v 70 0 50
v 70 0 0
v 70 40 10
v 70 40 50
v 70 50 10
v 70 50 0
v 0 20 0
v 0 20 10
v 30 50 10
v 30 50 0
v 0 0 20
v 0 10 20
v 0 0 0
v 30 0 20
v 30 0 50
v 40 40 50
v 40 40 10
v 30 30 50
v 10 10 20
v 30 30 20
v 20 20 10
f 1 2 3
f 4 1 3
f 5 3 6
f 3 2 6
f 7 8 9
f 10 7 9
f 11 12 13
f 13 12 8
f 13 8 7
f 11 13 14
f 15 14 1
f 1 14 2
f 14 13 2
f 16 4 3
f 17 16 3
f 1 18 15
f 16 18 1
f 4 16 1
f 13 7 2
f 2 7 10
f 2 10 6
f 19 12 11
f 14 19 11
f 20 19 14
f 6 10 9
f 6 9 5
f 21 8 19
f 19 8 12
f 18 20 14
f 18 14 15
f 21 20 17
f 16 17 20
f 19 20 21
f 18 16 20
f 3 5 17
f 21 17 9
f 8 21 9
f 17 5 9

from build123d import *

# Parameters (mm, degrees)
SKETCH1_W           = 70
SKETCH1_H           = 50
BOSS_EXTRUDE1_DEPTH = 50
CUT_EXTRUDE1_DEPTH  = 50
SKETCH3_W           = 40
SKETCH3_H           = 10
CUT_EXTRUDE2_DEPTH  = 50
CUT_EXTRUDE3_DEPTH  = 20
CUT_EXTRUDE4_DEPTH  = 10
CUT_EXTRUDE6_DEPTH  = 30
CUT_EXTRUDE7_DEPTH  = 30
CUT_EXTRUDE9_DEPTH  = 10
BOSS_EXTRUDE2_DEPTH = 43
CUT_EXTRUDE10_DEPTH = 10


with BuildPart() as part:
    # Sketch1 → Boss-Extrude1 (new body)
    with BuildSketch(Plane.XY):
        with Locations((35, 25)):
            Rectangle(SKETCH1_W, SKETCH1_H)
    extrude(amount=BOSS_EXTRUDE1_DEPTH)

    # Sketch2 → Cut-Extrude1 (cut)
    with BuildSketch(Plane.XY.offset(50)):
        Polygon((0, 20), (30, 50), (0, 50), align=None)
    extrude(amount=-CUT_EXTRUDE1_DEPTH, mode=Mode.SUBTRACT)

    # Sketch3 → Cut-Extrude2 (cut)
    with BuildSketch(Plane(origin=(70, 0, 0), x_dir=(0, 0, -1), z_dir=(1, 0, 0))):
        with Locations((-30, 45)):
            Rectangle(SKETCH3_W, SKETCH3_H)
    extrude(amount=-CUT_EXTRUDE2_DEPTH, mode=Mode.SUBTRACT)

    # Sketch4 → Cut-Extrude3 (cut)
    with BuildSketch(Plane.XY.offset(50)):
        Polygon((30, 30), (40, 40), (20, 40), (0, 20), (0, 0), (30, 0), align=None)
    extrude(amount=-CUT_EXTRUDE3_DEPTH, mode=Mode.SUBTRACT)

    # Sketch5 → Cut-Extrude4 (cut)
    with BuildSketch(Plane.XY.offset(30)):
        Polygon((0, 10), (10, 10), (40, 40), (20, 40), (0, 20), align=None)
    extrude(amount=-CUT_EXTRUDE4_DEPTH, mode=Mode.SUBTRACT)

    # Sketch6 → Cut-Extrude6 (cut)
    with BuildSketch(Plane.ZY):
        Polygon((30, 10), (20, 0), (30, 0), align=None)
    extrude(amount=-CUT_EXTRUDE6_DEPTH, mode=Mode.SUBTRACT)

    # Sketch7 → Cut-Extrude7 (cut)
    with BuildSketch(Plane.ZY):
        Polygon((30, 10), (20, 10), (20, 0), align=None)
    extrude(amount=-CUT_EXTRUDE7_DEPTH, mode=Mode.SUBTRACT)

    # Sketch9 → Cut-Extrude9 (cut)
    with BuildSketch(Plane.XY.offset(20)):
        Polygon((20, 40), (40, 40), (10, 10), (0, 10), (0, 20), align=None)
    extrude(amount=-CUT_EXTRUDE9_DEPTH, mode=Mode.SUBTRACT)

    # Sketch10 → Boss-Extrude2 (add)
    with BuildSketch(Plane.ZY):
        Polygon((10, 20), (20, 10), (10, 10), align=None)
    extrude(amount=-BOSS_EXTRUDE2_DEPTH)

    # Sketch13 → Cut-Extrude10 (cut)
    with BuildSketch(Plane.XY.offset(30)):
        Polygon((10, 10), (30, 10), (30, 30), align=None)
    extrude(amount=-CUT_EXTRUDE10_DEPTH, mode=Mode.SUBTRACT)


solid = part.part
